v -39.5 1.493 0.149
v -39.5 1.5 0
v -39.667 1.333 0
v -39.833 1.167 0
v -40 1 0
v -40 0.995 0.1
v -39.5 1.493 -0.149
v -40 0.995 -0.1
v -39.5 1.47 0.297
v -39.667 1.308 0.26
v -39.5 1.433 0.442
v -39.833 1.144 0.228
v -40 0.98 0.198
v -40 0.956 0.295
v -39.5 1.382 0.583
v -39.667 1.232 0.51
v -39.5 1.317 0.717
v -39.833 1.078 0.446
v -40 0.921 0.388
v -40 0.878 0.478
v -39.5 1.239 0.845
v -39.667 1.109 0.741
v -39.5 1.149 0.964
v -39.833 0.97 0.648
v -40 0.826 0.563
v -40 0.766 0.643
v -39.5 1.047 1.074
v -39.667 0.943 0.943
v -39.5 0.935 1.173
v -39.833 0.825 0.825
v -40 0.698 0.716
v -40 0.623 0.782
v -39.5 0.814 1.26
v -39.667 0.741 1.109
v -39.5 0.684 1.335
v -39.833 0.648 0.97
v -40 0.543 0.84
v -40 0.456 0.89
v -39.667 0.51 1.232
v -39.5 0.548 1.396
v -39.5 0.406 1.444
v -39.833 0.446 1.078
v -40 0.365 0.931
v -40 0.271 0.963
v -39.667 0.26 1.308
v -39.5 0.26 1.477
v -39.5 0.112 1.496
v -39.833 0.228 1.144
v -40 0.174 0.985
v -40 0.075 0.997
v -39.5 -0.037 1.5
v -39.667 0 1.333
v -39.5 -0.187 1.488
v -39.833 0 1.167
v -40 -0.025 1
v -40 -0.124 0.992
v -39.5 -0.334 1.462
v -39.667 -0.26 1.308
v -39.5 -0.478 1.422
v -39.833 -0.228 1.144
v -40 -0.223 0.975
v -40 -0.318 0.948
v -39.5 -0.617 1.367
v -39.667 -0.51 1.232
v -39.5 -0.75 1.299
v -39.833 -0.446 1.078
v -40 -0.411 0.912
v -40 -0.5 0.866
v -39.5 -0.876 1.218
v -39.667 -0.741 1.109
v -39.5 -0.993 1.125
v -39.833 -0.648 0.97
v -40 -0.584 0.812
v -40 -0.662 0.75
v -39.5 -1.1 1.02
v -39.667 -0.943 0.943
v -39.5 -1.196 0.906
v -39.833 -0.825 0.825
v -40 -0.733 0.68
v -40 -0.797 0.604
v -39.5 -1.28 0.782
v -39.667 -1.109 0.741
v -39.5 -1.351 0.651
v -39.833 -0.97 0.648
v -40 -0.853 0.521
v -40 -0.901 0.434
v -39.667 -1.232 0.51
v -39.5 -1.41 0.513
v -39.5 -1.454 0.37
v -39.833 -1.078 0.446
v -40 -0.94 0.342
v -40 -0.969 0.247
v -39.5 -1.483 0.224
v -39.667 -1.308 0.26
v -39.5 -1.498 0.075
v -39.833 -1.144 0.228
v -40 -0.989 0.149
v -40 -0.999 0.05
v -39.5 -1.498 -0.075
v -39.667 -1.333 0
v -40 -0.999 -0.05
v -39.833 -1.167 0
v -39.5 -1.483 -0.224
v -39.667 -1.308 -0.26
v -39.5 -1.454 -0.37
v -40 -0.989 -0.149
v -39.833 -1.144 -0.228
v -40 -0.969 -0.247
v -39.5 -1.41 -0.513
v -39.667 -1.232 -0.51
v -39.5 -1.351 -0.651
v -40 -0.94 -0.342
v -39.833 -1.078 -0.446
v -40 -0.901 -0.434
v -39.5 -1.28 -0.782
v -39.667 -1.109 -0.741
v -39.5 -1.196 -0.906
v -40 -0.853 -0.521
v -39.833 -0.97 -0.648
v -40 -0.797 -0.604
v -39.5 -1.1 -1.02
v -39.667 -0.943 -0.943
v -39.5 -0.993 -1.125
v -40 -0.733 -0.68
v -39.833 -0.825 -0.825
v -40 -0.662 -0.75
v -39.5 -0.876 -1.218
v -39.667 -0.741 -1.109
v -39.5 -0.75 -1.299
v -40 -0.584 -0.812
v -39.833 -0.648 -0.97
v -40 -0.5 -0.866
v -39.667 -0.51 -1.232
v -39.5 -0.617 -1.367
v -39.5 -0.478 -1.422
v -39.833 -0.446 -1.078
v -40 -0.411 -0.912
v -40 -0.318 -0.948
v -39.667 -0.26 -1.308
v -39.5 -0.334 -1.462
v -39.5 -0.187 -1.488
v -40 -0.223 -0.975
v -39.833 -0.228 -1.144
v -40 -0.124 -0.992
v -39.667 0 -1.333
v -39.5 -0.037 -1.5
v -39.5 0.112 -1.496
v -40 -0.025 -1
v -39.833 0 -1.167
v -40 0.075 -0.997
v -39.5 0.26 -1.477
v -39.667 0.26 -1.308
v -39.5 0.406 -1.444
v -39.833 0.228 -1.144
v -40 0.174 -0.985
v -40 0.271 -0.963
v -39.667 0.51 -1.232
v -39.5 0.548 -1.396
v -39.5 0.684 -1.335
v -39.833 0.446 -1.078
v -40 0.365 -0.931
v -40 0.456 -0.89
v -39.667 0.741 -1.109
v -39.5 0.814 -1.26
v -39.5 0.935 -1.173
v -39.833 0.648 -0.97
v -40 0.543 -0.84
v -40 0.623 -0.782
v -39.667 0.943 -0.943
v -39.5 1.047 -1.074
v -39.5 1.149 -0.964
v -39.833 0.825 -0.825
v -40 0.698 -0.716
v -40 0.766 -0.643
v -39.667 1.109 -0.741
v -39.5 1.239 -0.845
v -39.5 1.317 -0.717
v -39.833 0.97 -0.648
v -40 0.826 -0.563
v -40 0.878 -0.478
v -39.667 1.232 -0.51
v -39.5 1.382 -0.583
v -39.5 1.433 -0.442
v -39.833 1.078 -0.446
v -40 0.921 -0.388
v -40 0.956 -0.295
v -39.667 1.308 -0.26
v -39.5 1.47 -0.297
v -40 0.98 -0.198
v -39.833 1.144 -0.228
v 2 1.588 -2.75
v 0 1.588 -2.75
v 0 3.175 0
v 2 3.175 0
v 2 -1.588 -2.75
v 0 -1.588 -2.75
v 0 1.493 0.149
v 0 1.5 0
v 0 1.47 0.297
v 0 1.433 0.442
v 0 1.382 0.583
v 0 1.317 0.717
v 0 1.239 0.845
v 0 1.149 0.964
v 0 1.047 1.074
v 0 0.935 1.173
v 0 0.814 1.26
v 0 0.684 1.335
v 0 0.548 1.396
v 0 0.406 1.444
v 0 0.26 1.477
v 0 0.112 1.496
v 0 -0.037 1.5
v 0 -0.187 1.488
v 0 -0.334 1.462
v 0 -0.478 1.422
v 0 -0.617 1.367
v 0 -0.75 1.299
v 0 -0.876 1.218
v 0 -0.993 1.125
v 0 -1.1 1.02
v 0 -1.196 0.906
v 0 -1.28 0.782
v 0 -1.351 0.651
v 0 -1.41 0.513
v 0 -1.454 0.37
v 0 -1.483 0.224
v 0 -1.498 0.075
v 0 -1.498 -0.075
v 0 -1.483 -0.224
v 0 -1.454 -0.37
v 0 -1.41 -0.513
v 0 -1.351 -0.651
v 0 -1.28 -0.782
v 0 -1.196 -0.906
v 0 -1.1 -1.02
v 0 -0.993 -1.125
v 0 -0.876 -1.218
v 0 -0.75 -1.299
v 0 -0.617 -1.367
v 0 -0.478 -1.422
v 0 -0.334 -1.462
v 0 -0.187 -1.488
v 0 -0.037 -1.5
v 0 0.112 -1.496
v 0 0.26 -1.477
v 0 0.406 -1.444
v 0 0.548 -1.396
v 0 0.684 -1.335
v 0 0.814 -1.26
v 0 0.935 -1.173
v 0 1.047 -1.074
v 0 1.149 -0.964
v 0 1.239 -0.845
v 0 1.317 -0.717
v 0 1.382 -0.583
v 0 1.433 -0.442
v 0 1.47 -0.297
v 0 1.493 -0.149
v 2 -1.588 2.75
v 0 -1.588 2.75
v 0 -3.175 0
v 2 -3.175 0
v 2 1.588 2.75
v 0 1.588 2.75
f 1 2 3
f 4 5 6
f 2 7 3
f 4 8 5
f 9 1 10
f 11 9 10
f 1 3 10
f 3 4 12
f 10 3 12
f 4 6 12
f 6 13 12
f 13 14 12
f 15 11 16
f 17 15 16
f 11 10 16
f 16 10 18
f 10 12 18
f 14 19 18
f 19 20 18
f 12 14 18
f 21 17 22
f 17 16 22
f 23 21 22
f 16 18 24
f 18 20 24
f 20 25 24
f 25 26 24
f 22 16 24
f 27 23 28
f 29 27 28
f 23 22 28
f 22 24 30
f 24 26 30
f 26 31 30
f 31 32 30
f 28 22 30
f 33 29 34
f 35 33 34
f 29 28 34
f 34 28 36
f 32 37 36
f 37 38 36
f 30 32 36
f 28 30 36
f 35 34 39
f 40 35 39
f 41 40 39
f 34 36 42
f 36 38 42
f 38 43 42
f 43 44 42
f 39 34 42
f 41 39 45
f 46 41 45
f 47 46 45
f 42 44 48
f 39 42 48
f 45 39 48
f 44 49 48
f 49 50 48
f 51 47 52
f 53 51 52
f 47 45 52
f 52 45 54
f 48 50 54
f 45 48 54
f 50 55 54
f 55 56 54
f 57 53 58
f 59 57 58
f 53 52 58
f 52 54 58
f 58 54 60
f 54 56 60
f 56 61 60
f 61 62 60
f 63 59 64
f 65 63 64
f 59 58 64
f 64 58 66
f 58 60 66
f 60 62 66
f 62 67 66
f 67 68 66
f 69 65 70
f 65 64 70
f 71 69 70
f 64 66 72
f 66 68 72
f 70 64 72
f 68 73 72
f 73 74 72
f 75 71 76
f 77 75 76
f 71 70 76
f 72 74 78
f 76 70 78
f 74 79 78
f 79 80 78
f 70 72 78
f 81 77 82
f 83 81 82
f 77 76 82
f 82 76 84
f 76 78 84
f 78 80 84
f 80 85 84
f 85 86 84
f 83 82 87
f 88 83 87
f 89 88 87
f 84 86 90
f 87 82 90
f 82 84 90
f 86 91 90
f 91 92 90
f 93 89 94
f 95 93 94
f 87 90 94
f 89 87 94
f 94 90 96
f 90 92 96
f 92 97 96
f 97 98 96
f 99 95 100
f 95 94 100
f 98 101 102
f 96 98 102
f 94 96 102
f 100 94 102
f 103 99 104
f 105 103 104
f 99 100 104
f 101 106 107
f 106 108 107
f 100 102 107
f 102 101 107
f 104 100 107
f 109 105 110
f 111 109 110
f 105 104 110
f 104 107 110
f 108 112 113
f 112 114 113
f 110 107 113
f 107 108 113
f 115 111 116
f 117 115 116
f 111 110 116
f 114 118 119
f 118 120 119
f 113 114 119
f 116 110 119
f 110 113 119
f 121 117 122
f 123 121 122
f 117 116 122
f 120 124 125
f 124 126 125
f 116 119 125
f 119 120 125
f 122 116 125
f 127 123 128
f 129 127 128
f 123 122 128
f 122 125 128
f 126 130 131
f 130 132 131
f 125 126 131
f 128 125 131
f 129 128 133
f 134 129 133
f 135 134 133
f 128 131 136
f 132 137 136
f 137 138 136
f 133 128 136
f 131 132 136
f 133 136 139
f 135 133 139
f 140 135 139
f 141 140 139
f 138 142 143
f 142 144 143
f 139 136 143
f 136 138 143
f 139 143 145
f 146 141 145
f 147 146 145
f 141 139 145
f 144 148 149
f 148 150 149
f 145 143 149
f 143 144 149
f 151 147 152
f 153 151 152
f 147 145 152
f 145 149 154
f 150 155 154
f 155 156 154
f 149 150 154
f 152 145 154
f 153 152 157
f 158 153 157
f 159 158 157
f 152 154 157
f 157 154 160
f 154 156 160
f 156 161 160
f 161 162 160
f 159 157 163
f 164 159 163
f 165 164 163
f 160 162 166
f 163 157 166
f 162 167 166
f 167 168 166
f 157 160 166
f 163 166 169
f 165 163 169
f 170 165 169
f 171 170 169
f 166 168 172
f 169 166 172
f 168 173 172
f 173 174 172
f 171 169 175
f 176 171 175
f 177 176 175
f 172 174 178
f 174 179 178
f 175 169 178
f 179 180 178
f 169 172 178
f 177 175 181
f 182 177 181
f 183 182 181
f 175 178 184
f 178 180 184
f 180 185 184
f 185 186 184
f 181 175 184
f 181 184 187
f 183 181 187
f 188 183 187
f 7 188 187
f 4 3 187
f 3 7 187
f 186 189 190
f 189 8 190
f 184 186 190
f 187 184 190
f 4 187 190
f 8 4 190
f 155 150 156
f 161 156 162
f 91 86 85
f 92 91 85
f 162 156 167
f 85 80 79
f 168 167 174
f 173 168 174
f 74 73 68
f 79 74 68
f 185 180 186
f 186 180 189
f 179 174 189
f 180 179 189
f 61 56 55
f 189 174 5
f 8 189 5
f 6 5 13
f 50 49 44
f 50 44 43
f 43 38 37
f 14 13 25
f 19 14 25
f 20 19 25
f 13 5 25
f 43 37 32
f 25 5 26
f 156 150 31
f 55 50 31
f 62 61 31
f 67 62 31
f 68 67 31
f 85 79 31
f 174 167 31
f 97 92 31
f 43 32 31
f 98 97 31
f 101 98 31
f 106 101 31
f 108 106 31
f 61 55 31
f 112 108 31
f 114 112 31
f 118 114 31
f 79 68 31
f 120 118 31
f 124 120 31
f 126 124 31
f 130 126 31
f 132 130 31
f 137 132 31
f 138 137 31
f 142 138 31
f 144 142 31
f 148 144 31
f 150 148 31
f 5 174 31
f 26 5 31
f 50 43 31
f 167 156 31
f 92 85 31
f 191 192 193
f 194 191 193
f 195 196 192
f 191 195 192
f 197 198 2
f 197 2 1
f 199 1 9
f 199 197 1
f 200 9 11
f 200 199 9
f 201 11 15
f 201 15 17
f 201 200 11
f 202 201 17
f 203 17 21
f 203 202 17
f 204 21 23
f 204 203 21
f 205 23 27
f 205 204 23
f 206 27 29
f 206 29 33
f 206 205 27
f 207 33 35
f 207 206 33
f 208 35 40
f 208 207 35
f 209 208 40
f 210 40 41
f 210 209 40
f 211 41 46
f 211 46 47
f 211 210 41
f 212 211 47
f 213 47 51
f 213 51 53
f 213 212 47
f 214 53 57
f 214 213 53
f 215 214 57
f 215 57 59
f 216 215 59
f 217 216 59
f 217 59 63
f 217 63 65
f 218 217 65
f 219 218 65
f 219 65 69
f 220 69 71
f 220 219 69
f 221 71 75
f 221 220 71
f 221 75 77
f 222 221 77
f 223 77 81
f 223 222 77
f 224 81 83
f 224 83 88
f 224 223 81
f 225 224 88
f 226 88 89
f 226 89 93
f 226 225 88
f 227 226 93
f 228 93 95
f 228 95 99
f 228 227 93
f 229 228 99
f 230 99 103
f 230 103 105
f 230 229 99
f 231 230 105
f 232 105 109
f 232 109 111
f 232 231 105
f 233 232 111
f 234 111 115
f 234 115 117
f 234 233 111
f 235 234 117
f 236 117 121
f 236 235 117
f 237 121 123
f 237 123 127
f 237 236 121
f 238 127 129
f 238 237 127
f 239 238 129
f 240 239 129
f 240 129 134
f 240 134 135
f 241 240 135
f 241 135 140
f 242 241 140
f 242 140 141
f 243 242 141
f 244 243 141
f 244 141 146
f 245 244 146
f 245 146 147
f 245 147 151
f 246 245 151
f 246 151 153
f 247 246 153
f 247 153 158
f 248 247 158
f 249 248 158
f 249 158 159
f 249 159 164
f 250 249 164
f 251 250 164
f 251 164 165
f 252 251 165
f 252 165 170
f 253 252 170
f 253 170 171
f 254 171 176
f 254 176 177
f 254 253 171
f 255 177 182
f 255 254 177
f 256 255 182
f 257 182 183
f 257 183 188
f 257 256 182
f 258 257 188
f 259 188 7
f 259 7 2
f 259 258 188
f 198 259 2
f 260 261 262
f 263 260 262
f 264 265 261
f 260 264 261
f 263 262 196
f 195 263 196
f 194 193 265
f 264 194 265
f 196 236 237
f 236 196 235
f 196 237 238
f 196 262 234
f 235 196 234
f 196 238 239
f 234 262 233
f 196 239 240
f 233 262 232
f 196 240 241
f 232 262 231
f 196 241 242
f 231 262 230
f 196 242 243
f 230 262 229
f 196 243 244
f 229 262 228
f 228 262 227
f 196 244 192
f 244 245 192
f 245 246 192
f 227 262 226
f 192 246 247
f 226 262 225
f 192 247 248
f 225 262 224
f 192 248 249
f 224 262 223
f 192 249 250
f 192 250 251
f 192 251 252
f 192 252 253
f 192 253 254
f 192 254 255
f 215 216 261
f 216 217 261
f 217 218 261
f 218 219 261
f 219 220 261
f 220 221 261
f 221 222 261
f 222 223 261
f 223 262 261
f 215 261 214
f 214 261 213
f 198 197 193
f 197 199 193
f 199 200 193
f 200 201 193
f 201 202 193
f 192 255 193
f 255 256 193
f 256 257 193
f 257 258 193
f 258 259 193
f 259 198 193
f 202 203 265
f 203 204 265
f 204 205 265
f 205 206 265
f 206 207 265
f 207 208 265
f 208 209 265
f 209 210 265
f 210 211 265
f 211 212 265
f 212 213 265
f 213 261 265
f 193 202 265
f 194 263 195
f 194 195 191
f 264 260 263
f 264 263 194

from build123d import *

# Parameters (mm, degrees)
F1_DEPTH = 2
F2_R     = 1.5
F3_DEPTH = 40
F4_SIZE  = 0.5


with BuildPart() as f1:
    # F0 (on Right) → F1 (new body)
    with BuildSketch(Plane.YZ):
        Polygon((1.587713, 2.75), (-1.587713, 2.75), (-3.175426, 0), (-1.587713, -2.75), (1.587713, -2.75), (3.175426, 0), align=None)
    extrude(amount=F1_DEPTH)

    # F2 (on Right) → F3 (join)
    with BuildSketch(Plane.YZ):
        Circle(F2_R)
    extrude(amount=-F3_DEPTH)

    # F4
    f4_edges = [f1.edges().sort_by_distance(p)[0] for p in [
        (-40, -1.5, 0),
    ]]
    chamfer(f4_edges, length=F4_SIZE)


solid = f1.part
